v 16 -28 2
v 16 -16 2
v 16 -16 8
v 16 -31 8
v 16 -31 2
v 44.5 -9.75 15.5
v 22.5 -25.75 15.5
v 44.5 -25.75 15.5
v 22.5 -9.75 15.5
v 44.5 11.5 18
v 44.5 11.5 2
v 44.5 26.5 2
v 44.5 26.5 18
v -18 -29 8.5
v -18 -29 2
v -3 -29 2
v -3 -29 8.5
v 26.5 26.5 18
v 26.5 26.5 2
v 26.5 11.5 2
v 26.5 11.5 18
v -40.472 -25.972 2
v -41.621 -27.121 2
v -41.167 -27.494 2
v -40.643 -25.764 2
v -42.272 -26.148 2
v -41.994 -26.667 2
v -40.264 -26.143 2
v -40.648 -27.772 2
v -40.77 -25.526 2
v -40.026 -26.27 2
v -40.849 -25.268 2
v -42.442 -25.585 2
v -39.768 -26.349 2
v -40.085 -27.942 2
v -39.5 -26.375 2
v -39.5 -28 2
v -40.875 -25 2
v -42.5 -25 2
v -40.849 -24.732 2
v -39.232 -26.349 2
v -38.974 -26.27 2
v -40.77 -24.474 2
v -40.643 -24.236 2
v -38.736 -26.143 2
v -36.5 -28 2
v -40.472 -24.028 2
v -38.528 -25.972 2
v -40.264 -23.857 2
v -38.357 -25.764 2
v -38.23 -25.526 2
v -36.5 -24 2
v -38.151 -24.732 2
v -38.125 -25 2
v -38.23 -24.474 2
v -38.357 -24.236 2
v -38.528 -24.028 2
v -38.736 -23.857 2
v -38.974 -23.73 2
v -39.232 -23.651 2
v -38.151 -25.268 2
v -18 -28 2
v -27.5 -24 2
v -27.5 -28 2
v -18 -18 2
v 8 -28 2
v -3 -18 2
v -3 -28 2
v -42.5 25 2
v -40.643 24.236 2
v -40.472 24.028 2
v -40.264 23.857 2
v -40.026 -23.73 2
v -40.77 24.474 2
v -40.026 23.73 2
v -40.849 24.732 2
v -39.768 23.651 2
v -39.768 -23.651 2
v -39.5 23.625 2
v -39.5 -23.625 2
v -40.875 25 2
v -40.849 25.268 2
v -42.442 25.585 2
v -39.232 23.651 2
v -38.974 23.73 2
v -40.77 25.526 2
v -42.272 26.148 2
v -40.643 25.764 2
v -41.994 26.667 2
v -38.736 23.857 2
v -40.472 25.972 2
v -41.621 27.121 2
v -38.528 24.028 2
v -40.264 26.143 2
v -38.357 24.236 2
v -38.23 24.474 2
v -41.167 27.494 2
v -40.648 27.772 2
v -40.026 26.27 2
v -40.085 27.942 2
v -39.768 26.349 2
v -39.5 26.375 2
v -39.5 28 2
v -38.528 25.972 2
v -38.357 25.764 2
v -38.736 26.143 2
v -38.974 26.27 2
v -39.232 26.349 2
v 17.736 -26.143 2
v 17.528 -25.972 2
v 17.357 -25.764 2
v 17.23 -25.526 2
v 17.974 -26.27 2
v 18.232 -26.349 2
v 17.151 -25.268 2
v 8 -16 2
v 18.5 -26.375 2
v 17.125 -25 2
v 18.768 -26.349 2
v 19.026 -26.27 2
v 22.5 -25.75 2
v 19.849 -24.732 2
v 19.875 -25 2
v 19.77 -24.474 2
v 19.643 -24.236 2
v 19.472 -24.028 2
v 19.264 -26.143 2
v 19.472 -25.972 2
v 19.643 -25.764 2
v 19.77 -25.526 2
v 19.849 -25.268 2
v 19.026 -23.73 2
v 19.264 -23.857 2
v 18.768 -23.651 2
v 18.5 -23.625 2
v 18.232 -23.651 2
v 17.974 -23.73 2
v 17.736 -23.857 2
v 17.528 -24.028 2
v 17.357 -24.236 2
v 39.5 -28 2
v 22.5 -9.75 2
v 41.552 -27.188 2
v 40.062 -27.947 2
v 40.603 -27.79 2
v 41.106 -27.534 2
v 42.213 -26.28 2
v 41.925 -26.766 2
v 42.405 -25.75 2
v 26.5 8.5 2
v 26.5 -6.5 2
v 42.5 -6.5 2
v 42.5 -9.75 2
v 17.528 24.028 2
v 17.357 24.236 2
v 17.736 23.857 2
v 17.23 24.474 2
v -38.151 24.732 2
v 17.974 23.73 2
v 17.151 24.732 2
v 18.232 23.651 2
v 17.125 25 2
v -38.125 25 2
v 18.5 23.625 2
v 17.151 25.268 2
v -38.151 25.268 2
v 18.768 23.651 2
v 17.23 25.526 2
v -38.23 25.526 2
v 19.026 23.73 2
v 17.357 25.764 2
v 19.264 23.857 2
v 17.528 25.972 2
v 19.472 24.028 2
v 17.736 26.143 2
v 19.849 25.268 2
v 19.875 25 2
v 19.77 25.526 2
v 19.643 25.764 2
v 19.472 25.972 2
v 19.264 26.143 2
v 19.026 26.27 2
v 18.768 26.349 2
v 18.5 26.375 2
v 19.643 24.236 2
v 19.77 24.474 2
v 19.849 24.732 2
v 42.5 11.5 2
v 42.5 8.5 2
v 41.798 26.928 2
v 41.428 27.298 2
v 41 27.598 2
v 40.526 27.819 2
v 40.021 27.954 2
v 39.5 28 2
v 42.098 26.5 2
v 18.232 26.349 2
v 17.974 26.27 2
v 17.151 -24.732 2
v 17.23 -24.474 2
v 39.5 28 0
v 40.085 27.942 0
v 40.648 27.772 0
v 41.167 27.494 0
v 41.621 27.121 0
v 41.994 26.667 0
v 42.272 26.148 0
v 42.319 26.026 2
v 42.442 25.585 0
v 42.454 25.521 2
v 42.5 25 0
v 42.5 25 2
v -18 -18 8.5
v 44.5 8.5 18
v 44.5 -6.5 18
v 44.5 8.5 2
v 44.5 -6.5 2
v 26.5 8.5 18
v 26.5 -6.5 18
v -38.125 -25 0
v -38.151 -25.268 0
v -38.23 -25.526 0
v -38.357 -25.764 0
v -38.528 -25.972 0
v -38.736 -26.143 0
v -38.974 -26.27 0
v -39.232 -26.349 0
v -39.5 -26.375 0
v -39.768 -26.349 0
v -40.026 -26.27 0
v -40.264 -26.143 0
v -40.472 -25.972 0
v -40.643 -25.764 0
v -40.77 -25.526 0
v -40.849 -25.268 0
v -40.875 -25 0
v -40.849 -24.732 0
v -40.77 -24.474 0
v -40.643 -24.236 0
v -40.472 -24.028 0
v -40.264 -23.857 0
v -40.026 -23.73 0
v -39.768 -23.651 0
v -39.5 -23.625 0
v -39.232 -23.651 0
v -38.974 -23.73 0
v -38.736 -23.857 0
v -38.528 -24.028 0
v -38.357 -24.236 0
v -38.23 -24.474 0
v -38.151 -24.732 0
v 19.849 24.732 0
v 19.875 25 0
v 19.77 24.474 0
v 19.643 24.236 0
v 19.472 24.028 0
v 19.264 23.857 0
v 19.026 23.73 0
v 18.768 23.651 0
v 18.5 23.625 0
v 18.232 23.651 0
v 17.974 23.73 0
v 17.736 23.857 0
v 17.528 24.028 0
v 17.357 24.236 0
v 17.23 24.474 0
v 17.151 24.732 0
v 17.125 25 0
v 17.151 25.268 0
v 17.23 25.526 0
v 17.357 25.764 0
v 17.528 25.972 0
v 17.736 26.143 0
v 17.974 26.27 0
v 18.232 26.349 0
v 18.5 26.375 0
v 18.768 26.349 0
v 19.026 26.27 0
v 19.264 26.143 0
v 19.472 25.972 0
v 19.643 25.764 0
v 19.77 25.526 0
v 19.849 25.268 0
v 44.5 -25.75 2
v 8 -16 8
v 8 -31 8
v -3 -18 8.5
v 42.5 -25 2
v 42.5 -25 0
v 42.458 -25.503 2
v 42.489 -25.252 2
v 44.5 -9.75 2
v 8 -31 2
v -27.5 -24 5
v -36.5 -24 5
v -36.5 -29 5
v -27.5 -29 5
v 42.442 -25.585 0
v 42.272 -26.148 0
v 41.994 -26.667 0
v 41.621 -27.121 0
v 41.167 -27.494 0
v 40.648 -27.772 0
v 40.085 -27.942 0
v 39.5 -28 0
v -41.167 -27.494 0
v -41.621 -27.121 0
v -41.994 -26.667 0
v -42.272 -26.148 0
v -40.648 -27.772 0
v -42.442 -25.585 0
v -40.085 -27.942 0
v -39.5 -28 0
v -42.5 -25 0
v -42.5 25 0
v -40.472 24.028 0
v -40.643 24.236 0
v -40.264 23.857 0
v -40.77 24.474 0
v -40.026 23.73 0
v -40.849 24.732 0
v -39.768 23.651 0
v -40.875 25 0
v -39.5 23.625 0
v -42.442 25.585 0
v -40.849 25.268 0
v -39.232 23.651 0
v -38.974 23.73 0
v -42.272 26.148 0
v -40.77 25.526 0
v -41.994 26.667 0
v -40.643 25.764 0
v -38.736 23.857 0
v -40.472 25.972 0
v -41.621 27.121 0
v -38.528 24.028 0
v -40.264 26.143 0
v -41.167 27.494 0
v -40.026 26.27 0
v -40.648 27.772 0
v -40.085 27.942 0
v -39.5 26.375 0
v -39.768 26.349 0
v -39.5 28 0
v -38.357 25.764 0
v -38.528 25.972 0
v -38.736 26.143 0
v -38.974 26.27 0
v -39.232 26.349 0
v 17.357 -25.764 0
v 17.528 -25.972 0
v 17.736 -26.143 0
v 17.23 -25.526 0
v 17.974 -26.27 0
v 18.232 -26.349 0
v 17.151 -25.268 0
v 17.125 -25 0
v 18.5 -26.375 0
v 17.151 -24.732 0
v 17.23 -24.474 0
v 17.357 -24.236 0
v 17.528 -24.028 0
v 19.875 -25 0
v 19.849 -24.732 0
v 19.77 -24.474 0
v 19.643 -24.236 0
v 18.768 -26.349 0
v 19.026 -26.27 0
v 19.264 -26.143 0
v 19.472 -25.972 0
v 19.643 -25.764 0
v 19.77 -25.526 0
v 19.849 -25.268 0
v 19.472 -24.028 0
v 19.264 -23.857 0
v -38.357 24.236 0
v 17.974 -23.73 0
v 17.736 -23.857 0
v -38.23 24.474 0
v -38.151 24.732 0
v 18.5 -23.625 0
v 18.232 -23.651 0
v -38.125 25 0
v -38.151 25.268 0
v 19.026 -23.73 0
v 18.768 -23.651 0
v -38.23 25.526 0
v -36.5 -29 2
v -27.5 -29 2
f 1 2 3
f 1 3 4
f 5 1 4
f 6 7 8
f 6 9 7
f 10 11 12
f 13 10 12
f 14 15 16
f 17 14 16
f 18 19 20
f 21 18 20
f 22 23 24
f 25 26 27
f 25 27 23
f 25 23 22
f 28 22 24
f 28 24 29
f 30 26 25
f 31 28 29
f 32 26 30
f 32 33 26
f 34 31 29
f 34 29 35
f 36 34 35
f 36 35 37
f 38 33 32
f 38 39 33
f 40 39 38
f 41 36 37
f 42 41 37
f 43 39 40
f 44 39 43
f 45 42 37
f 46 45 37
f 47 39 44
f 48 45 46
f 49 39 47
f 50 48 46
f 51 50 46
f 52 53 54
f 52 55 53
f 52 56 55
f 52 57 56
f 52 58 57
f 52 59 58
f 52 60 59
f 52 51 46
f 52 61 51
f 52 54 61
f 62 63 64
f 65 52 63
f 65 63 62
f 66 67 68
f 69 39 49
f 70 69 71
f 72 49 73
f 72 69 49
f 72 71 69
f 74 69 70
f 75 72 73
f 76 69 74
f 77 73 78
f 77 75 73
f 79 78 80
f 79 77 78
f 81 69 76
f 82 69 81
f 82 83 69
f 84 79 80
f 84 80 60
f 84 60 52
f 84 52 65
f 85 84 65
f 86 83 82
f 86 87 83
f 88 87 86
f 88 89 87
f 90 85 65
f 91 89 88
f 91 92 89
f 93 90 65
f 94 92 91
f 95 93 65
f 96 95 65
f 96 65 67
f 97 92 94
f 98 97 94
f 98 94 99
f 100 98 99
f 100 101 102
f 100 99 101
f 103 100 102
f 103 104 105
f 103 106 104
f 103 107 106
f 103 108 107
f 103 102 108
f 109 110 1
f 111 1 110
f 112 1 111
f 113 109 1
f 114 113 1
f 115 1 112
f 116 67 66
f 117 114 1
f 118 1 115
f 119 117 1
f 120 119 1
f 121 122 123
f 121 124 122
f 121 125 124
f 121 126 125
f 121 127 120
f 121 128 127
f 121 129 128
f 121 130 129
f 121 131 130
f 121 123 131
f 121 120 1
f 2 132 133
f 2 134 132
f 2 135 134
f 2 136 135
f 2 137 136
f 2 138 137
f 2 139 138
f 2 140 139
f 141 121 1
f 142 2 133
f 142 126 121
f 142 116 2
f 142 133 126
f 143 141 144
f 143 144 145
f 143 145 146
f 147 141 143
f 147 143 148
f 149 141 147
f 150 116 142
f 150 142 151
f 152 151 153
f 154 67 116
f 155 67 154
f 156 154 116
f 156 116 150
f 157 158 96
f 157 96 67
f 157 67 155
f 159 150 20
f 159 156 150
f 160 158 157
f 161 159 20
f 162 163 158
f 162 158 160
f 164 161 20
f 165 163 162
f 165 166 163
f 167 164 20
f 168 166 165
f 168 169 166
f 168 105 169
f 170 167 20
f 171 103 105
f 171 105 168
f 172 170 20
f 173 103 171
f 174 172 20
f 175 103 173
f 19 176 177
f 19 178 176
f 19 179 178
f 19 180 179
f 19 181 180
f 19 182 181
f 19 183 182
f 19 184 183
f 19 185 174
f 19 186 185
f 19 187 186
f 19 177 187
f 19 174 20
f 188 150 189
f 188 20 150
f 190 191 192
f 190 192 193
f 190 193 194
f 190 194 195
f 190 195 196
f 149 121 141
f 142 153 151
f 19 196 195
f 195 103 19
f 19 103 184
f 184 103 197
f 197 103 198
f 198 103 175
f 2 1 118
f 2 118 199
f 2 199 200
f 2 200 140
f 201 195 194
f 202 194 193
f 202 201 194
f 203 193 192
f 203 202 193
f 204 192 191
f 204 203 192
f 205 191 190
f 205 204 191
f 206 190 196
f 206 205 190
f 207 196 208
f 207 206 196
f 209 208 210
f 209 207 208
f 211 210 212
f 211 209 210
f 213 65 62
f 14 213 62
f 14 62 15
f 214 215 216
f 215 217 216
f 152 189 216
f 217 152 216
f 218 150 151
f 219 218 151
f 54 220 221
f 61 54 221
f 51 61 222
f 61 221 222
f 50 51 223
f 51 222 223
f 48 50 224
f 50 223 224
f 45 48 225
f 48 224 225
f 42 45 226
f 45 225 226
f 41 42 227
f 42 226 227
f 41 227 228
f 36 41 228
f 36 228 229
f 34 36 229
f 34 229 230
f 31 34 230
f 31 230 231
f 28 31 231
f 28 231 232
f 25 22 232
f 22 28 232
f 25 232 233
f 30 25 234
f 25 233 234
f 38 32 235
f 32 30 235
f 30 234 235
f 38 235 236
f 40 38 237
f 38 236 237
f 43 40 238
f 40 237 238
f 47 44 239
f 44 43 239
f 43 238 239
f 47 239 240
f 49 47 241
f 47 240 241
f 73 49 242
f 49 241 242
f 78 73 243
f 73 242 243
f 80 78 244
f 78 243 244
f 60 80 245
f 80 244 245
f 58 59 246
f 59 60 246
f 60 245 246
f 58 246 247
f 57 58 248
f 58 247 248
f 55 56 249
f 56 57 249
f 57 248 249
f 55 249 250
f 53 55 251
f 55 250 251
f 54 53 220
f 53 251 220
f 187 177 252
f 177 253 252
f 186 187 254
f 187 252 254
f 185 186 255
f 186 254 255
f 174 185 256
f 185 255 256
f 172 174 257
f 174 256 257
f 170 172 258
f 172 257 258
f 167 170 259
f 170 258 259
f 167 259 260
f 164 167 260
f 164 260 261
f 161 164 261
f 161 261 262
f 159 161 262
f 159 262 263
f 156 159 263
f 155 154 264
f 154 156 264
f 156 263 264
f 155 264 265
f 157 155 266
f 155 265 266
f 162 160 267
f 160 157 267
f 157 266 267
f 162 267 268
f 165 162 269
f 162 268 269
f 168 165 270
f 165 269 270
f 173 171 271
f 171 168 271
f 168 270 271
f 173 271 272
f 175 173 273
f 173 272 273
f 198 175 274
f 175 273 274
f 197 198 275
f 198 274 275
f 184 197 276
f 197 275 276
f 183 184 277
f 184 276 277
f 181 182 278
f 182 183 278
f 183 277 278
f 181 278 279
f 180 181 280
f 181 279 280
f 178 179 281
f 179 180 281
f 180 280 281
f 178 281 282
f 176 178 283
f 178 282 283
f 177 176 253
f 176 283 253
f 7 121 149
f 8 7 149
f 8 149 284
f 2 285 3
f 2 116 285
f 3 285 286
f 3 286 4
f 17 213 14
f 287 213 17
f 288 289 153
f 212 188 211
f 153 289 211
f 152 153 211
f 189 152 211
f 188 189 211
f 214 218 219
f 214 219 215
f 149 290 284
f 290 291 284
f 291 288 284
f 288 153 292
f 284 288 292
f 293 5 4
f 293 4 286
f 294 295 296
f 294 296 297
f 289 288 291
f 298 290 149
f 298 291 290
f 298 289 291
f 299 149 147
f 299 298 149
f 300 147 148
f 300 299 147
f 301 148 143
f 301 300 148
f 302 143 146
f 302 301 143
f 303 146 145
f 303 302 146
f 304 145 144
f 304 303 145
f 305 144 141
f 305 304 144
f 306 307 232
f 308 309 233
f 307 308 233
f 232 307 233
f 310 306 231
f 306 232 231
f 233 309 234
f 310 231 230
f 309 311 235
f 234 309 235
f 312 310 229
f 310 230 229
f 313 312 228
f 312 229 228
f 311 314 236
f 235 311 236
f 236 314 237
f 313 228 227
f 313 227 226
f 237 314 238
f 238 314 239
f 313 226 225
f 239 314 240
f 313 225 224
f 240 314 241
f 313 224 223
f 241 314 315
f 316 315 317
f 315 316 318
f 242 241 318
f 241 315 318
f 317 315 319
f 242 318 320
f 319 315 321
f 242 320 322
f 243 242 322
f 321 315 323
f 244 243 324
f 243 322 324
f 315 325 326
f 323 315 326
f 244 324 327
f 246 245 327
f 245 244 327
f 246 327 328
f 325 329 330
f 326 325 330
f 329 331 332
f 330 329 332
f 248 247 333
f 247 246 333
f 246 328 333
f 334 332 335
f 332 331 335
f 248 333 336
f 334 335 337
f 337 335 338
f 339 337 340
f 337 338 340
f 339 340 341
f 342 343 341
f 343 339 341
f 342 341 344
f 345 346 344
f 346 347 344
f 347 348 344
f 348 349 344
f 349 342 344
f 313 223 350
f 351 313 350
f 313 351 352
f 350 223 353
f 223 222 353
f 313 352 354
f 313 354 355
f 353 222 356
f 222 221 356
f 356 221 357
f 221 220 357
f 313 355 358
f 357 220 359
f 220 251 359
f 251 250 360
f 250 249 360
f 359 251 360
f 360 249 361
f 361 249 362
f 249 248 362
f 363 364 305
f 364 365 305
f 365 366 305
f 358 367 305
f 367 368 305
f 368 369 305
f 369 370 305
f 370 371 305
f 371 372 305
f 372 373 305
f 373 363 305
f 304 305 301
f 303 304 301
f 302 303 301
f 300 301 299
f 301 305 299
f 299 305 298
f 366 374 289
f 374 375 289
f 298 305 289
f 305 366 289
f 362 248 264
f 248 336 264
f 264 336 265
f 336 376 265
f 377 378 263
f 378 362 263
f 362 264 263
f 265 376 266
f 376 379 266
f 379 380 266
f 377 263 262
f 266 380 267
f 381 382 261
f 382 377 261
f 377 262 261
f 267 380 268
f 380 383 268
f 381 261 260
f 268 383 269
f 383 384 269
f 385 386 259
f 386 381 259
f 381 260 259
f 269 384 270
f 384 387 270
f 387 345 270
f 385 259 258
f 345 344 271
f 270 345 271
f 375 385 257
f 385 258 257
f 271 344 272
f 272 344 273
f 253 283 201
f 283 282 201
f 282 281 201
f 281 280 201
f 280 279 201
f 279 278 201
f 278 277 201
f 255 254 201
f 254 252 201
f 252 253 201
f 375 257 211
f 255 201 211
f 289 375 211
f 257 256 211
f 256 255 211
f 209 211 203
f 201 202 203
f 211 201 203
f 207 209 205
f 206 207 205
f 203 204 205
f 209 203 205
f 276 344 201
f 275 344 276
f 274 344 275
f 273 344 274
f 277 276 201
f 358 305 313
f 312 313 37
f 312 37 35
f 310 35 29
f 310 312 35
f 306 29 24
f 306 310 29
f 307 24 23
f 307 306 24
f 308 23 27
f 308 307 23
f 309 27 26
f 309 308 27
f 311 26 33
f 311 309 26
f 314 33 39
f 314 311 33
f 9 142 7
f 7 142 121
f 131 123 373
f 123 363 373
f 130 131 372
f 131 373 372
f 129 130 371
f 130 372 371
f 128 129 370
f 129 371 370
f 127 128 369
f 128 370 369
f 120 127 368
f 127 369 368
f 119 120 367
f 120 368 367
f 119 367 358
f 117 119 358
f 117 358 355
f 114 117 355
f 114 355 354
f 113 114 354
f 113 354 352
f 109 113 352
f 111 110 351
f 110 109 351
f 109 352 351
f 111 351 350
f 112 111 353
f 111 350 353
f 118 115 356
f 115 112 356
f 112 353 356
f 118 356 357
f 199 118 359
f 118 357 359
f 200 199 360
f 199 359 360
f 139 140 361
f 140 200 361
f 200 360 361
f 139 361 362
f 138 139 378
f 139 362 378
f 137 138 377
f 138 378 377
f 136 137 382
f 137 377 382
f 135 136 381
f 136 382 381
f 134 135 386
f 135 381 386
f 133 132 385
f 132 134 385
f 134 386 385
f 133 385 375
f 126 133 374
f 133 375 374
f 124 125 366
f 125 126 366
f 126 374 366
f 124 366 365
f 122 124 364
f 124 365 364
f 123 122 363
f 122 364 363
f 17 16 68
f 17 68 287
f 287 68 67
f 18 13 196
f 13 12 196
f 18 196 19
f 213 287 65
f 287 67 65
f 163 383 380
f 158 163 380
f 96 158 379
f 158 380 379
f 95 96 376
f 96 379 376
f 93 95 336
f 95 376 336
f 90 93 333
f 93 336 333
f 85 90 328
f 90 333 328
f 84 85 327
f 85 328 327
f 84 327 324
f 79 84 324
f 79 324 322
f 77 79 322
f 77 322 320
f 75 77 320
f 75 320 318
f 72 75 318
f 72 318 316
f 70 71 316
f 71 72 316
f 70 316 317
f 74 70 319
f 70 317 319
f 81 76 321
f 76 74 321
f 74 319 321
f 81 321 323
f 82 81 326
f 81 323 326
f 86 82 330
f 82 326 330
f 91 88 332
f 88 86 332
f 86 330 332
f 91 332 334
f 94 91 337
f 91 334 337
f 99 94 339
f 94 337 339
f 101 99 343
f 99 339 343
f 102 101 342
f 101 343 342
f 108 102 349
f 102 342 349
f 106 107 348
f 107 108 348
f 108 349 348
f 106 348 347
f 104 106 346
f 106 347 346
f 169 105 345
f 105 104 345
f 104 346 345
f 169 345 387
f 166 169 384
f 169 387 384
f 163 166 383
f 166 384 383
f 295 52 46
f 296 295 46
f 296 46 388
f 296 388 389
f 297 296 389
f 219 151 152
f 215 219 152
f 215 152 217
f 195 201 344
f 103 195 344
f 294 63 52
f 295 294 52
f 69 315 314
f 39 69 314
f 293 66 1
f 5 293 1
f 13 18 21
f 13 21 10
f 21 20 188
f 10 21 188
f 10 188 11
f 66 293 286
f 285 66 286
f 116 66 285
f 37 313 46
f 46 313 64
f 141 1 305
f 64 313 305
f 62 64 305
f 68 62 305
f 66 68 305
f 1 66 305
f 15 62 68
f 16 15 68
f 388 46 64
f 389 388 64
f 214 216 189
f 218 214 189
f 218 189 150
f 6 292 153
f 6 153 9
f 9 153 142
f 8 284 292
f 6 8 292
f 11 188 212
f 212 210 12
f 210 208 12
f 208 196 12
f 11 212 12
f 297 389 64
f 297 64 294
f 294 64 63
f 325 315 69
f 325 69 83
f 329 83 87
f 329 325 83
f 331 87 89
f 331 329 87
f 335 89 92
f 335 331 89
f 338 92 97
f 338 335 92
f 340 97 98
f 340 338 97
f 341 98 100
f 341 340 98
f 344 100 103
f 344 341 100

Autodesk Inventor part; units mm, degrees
ref_plane "YZ Plane" through (0, 0, 0) normal (1, 0, 0) x (0, 1, 0)
ref_plane "XZ Plane" through (0, 0, 0) normal (0, 1, 0) x (-1, 0, 0)
ref_plane "XY Plane" through (0, 0, 0) normal (0, 0, 1) x (1, 0, 0)
sketch "Boceto1" plane through (0, 0, 0) normal (0, 0, 1) x (1, 0, 0)
  line L0 (-39.5, -28) -> (39.5, -28)
  line L1 (42.5, -25) -> (42.5, 25)
  line L2 (39.5, 28) -> (-39.5, 28)
  line L3 (-42.5, 25) -> (-42.5, -25)
  line L4 (-42.5, -28) -> (42.5, 28) construction
  line L5 (42.5, -28) -> (-42.5, 28) construction
  arc A0 (-39.5, 28) -> (-42.5, 25) centre (-39.5, 25) ccw
  arc A1 (42.5, 25) -> (39.5, 28) centre (39.5, 25) ccw
  arc A2 (39.5, -28) -> (42.5, -25) centre (39.5, -25) ccw
  arc A3 (-42.5, -25) -> (-39.5, -28) centre (-39.5, -25) ccw
  circle A4 centre (-39.5, 25) radius 1.375
  circle A5 centre (-39.5, -25) radius 1.375
  circle A6 centre (18.5, -25) radius 1.375
  circle A7 centre (18.5, 25) radius 1.375
  point P0 (0, 0)
  dimension "d0" = 85
  dimension "d1" = 56
  dimension "d2" = 3
  dimension "d3" = 2.75
  dimension "d4" = 2.75
  dimension "d5" = 2.75
  dimension "d6" = 2.75
  dimension "d7" = 58
extrude "Extrusión1" add sketch "Boceto1" along normal blind 2
sketch "Boceto2" plane through (0, 0, 2) normal (0, 0, 1) x (1, 0, 0)
  line L0 (26.5, -6.5) -> (44.5, -6.5)
  line L1 (44.5, -6.5) -> (44.5, 8.5)
  line L2 (44.5, 8.5) -> (26.5, 8.5)
  line L3 (26.5, 8.5) -> (26.5, -6.5)
  line L4 (26.5, -6.5) -> (44.5, 8.5) construction
  line L5 (44.5, -6.5) -> (26.5, 8.5) construction
  line L6 (-39.5, -28) -> (39.5, -28) projected
  line L7 (22.5, -25.75) -> (44.5, -25.75)
  line L8 (44.5, -25.75) -> (44.5, -9.75)
  line L9 (44.5, -9.75) -> (22.5, -9.75)
  line L10 (22.5, -9.75) -> (22.5, -25.75)
  line L11 (22.5, -25.75) -> (44.5, -9.75) construction
  line L12 (44.5, -25.75) -> (22.5, -9.75) construction
  line L13 (-18, -29) -> (-3, -29)
  line L14 (-3, -29) -> (-3, -18)
  line L15 (-3, -18) -> (-18, -18)
  line L16 (-18, -18) -> (-18, -29)
  line L17 (-18, -29) -> (-3, -18) construction
  line L18 (-3, -29) -> (-18, -18) construction
  line L19 (-42.5, 25) -> (-42.5, -25) projected
  line L20 (8, -16) -> (16, -16)
  line L21 (16, -16) -> (16, -31)
  line L22 (16, -31) -> (8, -31)
  line L23 (8, -31) -> (8, -16)
  line L24 (8, -16) -> (16, -31) construction
  line L25 (16, -16) -> (8, -31) construction
  line L26 (-36.5, -29) -> (-27.5, -29)
  line L27 (-27.5, -29) -> (-27.5, -24)
  line L28 (-27.5, -24) -> (-36.5, -24)
  line L29 (-36.5, -24) -> (-36.5, -29)
  line L30 (-36.5, -29) -> (-27.5, -24) construction
  line L31 (-27.5, -29) -> (-36.5, -24) construction
  line L32 (26.5, 11.5) -> (44.5, 11.5)
  line L33 (44.5, 11.5) -> (44.5, 26.5)
  line L34 (44.5, 26.5) -> (26.5, 26.5)
  line L35 (26.5, 26.5) -> (26.5, 11.5)
  line L36 (26.5, 11.5) -> (44.5, 26.5) construction
  line L37 (44.5, 11.5) -> (26.5, 26.5) construction
  line L38 (42.5, -25) -> (42.5, 25) projected
  point P0 (0, 0)
  point P1 (35.5, 1)
  point P2 (33.5, -17.75)
  point P3 (-10.5, -23.5)
  point P4 (12, -23.5)
  point P5 (-32, -26.5)
  point P6 (35.5, 19)
  dimension "d11" = 15
  dimension "d15" = 29
  dimension "d18" = 22
  dimension "d19" = 16
  dimension "d20" = 10.25
  dimension "d22" = 15
  dimension "d23" = 11
  dimension "d24" = 1
  dimension "d25" = 32
  dimension "d26" = 8
  dimension "d27" = 15
  dimension "d28" = 3
  dimension "d29" = 54.5
  dimension "d30" = 9
  dimension "d31" = 5
  dimension "d33" = 1
  dimension "d34" = 10.5
  dimension "d45" = 15
  dimension "d46" = 2
  dimension "d47" = 47
extrude "Extrusión3" add sketch "Boceto2" along normal blind 13.5 contours L9 L8 L7 L10
extrude "Extrusión4" add sketch "Boceto2" along normal blind 6 contours L23 L20 L21 L6 | L6 L21 L22 L23
extrude "Extrusión5" add sketch "Boceto2" along normal blind 6.5 contours L16 L15 L14 L6 | L6 L14 L13 L16
extrude "Extrusión6" add sketch "Boceto2" along normal blind 3 contours L29 L28 L27 L6 | L6 L27 L26 L29
extrude "Extrusión7" add sketch "Boceto2" along normal blind 16 contours L3 L2 L38 L0 | L32 L35 L34 L33 | L38 L2 L1 L0
properties part number "RasPi3B+"
